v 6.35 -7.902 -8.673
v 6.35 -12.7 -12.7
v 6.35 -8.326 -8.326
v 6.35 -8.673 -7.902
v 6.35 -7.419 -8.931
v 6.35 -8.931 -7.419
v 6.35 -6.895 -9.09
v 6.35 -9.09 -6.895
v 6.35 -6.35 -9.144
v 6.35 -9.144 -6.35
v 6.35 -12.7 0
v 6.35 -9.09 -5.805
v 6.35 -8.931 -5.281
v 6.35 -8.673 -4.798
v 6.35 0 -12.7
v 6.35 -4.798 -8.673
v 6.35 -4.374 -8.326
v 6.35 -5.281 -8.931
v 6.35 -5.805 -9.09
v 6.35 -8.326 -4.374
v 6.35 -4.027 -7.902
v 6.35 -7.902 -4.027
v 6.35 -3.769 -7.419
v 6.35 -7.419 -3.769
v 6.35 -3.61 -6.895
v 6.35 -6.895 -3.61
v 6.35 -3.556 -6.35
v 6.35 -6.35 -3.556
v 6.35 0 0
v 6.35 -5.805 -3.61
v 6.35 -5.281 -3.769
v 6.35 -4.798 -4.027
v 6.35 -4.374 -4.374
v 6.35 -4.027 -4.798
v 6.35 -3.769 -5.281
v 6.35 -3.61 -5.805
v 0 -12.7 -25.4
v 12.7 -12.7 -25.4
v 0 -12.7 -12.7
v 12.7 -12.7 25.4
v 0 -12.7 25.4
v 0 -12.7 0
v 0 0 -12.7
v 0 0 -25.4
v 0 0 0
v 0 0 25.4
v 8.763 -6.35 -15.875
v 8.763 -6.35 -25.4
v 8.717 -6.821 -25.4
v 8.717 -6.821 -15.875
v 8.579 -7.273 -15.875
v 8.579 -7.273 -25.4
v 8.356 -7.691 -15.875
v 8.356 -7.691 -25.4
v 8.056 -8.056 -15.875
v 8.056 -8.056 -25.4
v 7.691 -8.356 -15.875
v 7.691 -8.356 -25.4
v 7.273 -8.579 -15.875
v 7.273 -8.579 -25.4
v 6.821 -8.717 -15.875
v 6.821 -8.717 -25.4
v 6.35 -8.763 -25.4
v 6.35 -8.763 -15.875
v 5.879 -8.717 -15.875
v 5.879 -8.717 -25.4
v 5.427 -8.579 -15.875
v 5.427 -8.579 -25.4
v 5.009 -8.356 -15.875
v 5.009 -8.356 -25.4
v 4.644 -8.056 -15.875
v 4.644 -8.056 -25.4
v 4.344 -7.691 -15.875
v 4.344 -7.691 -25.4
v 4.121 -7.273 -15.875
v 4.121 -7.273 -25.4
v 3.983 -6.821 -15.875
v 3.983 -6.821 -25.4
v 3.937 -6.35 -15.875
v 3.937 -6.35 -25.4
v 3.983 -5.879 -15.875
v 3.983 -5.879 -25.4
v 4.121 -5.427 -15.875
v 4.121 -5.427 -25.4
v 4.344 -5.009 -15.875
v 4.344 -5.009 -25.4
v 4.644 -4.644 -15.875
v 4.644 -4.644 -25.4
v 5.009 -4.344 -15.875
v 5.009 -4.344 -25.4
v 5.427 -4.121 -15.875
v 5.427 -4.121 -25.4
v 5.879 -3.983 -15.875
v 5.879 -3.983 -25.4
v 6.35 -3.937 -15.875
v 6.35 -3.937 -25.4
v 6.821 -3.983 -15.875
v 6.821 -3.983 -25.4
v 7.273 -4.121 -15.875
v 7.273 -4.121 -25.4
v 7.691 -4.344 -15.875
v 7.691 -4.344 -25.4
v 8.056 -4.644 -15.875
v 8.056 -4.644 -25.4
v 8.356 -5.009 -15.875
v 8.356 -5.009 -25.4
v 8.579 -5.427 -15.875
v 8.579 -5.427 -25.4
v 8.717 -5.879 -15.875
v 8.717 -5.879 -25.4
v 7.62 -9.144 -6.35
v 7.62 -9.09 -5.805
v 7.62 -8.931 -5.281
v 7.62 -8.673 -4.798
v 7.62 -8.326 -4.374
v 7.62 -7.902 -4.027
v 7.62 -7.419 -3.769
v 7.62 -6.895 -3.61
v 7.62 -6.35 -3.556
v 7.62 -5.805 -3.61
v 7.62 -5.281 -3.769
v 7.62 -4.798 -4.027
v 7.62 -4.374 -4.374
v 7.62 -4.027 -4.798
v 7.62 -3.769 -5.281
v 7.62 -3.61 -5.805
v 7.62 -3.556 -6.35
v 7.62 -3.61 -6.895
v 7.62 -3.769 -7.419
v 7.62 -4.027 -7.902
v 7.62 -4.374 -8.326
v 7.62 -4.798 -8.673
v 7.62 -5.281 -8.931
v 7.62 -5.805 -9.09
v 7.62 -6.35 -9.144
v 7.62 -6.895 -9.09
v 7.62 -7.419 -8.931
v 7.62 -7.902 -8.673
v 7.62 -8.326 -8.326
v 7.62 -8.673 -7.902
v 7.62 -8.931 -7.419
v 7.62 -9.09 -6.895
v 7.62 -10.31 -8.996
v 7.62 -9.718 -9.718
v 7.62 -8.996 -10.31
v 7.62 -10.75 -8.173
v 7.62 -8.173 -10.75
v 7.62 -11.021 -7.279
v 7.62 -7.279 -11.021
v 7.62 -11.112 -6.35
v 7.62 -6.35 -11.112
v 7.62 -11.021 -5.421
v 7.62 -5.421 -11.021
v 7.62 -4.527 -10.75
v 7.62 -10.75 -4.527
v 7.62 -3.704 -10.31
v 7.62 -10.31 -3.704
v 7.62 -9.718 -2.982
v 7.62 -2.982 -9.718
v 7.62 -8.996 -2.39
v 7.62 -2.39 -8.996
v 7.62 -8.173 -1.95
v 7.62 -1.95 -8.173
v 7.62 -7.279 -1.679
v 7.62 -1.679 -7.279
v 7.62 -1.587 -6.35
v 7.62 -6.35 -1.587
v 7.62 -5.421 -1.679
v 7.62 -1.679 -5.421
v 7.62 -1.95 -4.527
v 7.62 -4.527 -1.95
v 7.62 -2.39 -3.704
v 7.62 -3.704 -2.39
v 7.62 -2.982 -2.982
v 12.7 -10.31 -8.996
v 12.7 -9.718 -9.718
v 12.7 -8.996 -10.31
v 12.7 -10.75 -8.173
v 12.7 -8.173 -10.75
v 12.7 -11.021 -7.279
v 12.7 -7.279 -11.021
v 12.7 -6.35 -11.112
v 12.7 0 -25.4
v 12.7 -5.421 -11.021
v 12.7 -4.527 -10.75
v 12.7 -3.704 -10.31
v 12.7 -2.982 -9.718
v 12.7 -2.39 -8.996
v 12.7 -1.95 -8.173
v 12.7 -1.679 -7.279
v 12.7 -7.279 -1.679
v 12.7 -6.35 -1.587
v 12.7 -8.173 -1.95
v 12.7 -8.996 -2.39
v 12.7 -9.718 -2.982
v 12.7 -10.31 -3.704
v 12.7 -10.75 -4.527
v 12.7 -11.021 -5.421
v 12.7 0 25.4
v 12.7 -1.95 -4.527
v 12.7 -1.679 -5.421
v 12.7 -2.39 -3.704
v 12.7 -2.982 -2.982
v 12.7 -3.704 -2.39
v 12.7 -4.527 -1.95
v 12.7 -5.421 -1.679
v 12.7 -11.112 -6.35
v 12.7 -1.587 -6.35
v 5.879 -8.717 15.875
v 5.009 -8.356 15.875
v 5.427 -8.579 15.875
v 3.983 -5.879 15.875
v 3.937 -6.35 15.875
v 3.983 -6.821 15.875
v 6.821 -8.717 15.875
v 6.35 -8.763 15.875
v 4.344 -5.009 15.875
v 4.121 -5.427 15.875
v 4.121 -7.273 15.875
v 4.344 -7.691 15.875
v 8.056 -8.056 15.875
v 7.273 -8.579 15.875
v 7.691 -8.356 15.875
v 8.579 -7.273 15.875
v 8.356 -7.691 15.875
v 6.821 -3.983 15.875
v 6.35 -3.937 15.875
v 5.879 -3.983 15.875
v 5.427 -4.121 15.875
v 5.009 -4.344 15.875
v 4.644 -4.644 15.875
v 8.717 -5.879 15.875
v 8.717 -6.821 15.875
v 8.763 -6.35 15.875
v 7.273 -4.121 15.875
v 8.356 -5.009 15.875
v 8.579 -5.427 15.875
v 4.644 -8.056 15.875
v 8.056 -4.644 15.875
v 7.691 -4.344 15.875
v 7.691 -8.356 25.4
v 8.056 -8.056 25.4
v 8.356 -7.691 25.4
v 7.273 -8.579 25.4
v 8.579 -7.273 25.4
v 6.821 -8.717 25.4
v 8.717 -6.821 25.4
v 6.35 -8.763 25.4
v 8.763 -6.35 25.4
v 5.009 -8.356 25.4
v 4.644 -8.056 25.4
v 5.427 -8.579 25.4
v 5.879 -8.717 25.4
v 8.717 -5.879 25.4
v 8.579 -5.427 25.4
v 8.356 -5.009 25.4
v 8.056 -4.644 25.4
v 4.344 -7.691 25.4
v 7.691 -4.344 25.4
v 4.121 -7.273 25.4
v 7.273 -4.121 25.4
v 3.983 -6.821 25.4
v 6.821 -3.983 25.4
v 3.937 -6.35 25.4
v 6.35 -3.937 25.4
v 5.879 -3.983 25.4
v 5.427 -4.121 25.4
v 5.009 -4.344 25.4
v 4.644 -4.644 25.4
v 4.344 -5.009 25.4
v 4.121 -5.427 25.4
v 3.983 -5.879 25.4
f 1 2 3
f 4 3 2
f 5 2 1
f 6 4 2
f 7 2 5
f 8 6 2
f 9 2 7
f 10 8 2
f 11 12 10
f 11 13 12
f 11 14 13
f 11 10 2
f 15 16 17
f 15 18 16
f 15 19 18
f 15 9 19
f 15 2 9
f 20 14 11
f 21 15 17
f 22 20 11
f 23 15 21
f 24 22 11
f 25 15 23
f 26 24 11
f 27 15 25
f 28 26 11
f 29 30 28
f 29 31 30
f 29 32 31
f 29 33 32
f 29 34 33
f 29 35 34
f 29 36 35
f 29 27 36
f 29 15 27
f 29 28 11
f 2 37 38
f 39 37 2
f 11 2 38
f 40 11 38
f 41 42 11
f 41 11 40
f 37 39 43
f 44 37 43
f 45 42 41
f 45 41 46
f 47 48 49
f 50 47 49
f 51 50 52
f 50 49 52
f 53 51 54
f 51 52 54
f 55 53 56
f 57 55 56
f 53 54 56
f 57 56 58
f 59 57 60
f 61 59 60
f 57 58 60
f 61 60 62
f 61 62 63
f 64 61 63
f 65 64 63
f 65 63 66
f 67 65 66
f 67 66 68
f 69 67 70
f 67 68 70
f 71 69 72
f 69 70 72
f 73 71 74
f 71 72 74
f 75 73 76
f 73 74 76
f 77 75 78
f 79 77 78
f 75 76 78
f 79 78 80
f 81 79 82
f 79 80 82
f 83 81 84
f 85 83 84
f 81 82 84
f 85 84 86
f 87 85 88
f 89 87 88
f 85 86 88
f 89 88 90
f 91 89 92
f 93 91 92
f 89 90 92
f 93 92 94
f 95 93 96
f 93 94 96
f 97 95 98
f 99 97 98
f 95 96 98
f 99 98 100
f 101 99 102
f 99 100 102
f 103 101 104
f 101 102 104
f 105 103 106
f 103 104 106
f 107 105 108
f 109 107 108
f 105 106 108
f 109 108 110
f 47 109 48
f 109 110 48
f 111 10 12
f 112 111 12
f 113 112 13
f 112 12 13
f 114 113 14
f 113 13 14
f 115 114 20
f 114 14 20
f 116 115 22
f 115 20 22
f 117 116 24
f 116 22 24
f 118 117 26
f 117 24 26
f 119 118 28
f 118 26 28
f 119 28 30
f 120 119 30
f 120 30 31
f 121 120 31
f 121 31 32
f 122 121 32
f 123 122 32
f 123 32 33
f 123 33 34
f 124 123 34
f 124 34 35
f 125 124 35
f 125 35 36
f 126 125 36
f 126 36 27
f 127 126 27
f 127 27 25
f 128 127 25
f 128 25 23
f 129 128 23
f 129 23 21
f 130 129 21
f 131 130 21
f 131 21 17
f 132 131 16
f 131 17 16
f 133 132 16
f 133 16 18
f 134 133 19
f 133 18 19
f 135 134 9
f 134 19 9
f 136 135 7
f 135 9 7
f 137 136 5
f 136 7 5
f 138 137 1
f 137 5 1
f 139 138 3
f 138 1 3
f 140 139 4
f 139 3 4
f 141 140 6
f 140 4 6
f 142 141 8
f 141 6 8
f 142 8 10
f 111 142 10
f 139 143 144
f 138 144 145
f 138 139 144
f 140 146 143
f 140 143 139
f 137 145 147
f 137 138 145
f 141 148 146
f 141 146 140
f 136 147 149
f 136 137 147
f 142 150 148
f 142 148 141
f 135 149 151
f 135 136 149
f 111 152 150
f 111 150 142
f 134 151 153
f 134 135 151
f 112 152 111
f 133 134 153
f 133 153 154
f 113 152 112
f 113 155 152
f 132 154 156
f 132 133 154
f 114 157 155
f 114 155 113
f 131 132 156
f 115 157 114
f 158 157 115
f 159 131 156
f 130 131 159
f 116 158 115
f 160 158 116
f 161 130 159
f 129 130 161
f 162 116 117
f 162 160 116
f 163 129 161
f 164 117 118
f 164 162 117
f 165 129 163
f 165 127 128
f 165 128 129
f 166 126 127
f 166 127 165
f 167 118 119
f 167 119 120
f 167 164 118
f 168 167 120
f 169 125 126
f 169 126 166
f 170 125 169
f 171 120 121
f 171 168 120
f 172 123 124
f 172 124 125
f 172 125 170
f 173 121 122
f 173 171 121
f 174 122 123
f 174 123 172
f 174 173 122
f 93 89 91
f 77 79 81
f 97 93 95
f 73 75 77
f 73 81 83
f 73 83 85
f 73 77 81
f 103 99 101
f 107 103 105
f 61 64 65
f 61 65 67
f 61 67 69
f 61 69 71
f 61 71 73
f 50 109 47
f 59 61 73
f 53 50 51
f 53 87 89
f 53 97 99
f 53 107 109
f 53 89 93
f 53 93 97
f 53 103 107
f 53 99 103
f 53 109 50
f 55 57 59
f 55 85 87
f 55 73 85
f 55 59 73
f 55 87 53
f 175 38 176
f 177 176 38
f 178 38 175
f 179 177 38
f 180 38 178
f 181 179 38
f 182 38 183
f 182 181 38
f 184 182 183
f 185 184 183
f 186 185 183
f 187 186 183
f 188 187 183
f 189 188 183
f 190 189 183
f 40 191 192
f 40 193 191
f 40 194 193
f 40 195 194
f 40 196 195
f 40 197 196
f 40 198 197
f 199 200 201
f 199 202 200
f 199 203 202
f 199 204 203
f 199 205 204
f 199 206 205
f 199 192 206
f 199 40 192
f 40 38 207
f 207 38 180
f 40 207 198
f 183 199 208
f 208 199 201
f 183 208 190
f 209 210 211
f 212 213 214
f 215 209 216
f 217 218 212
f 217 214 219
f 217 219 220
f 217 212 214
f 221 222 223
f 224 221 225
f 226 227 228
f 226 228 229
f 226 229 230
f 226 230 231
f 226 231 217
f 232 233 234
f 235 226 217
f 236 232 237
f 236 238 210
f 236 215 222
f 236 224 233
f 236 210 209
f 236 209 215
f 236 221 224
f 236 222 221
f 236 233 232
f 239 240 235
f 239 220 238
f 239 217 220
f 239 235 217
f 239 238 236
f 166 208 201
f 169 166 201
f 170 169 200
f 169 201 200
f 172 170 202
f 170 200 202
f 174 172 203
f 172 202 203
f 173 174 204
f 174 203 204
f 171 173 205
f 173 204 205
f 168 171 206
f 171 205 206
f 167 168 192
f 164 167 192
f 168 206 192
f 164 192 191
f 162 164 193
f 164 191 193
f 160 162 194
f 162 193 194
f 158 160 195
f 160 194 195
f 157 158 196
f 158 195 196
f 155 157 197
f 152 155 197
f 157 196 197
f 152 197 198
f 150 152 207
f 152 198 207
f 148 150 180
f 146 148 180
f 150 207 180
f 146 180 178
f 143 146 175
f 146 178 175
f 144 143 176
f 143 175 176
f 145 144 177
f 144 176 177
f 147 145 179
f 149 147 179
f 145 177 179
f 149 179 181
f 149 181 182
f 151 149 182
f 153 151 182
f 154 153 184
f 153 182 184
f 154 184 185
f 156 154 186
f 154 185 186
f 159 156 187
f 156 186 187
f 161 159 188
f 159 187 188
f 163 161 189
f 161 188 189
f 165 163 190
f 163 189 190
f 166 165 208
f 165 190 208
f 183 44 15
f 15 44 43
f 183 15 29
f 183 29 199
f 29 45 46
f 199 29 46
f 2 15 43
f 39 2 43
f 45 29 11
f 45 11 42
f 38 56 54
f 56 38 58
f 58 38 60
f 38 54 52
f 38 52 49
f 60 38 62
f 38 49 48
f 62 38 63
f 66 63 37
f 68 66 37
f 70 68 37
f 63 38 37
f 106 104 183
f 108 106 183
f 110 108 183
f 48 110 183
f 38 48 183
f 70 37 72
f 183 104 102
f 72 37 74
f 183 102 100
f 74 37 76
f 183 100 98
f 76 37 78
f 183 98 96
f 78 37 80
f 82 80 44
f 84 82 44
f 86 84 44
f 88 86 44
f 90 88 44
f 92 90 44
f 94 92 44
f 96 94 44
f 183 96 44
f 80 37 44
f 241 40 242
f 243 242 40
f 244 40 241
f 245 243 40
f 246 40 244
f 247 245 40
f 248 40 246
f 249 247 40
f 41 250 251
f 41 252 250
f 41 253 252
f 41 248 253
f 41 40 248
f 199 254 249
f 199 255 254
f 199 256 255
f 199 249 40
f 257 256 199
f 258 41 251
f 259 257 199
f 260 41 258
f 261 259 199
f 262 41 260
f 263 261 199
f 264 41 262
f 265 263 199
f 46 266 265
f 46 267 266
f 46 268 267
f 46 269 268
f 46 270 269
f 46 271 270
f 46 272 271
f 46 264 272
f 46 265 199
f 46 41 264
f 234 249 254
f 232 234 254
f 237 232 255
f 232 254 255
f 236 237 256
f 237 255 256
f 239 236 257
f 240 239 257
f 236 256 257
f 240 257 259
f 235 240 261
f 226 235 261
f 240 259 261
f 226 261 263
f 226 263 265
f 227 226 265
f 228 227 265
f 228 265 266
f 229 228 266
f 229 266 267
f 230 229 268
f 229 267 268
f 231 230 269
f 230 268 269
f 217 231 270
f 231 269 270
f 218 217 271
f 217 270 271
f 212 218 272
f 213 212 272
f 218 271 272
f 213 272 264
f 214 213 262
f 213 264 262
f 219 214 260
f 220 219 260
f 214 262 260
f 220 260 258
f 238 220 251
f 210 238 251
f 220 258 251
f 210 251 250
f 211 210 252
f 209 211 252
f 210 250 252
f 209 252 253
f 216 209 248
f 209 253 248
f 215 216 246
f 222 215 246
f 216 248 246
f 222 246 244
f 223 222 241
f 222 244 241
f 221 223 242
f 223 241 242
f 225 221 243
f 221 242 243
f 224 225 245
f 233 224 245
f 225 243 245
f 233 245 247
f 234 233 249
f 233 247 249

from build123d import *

# Parameters (mm, degrees)
F0_W      = 12.7
F0_H      = 50.8
F1_DEPTH  = 12.7
F2_W      = 6.35
F2_H      = 12.7
F3_DEPTH  = 12.701
F4_R      = 2.794
F5_DEPTH  = 6.351
F6_R      = 4.7625
F7_DEPTH  = 5.08
F8_R      = 2.413
F9_DEPTH  = 9.525
F10_R     = 2.413
F11_DEPTH = 9.525


with BuildPart() as f1:
    # F0 (on Right) → F1 (new body)
    with BuildSketch(Plane.YZ):
        with Locations((-6.35, 0)):
            Rectangle(F0_W, F0_H)
    extrude(amount=F1_DEPTH)

    # F2 (on face) → F3 (cut, through all)
    with BuildSketch(Plane(origin=(0, 0, 0), x_dir=(-1, 0, 0), z_dir=(0, 1, 0))):
        with Locations((-3.175, -6.35)):
            Rectangle(F2_W, F2_H)
    extrude(amount=-F3_DEPTH, mode=Mode.SUBTRACT)

    # F4 (on face) → F5 (cut, through all)
    with BuildSketch(Plane(origin=(6.35, 0, 0), x_dir=(0, -1, 0), z_dir=(-1, 0, 0))):
        with Locations((6.35, -6.35)):
            Circle(F4_R)
    extrude(amount=-F5_DEPTH, mode=Mode.SUBTRACT)

    # F6 (on face) → F7 (cut)
    with BuildSketch(Plane.YZ.offset(12.7)):
        with Locations((-6.35, -6.35)):
            Circle(F6_R)
    extrude(amount=-F7_DEPTH, mode=Mode.SUBTRACT)

    # F8 (on face) → F9 (cut)
    with BuildSketch(Plane.XY.offset(25.4)):
        with Locations((6.35, -6.35)):
            Circle(F8_R)
    extrude(amount=-F9_DEPTH, mode=Mode.SUBTRACT)

    # F10 (on face) → F11 (cut)
    with BuildSketch(Plane(origin=(0, 0, -25.4), x_dir=(1, 0, 0), z_dir=(0, 0, -1))):
        with Locations((6.35, 6.35)):
            Circle(F10_R)
    extrude(amount=-F11_DEPTH, mode=Mode.SUBTRACT)


solid = f1.part
